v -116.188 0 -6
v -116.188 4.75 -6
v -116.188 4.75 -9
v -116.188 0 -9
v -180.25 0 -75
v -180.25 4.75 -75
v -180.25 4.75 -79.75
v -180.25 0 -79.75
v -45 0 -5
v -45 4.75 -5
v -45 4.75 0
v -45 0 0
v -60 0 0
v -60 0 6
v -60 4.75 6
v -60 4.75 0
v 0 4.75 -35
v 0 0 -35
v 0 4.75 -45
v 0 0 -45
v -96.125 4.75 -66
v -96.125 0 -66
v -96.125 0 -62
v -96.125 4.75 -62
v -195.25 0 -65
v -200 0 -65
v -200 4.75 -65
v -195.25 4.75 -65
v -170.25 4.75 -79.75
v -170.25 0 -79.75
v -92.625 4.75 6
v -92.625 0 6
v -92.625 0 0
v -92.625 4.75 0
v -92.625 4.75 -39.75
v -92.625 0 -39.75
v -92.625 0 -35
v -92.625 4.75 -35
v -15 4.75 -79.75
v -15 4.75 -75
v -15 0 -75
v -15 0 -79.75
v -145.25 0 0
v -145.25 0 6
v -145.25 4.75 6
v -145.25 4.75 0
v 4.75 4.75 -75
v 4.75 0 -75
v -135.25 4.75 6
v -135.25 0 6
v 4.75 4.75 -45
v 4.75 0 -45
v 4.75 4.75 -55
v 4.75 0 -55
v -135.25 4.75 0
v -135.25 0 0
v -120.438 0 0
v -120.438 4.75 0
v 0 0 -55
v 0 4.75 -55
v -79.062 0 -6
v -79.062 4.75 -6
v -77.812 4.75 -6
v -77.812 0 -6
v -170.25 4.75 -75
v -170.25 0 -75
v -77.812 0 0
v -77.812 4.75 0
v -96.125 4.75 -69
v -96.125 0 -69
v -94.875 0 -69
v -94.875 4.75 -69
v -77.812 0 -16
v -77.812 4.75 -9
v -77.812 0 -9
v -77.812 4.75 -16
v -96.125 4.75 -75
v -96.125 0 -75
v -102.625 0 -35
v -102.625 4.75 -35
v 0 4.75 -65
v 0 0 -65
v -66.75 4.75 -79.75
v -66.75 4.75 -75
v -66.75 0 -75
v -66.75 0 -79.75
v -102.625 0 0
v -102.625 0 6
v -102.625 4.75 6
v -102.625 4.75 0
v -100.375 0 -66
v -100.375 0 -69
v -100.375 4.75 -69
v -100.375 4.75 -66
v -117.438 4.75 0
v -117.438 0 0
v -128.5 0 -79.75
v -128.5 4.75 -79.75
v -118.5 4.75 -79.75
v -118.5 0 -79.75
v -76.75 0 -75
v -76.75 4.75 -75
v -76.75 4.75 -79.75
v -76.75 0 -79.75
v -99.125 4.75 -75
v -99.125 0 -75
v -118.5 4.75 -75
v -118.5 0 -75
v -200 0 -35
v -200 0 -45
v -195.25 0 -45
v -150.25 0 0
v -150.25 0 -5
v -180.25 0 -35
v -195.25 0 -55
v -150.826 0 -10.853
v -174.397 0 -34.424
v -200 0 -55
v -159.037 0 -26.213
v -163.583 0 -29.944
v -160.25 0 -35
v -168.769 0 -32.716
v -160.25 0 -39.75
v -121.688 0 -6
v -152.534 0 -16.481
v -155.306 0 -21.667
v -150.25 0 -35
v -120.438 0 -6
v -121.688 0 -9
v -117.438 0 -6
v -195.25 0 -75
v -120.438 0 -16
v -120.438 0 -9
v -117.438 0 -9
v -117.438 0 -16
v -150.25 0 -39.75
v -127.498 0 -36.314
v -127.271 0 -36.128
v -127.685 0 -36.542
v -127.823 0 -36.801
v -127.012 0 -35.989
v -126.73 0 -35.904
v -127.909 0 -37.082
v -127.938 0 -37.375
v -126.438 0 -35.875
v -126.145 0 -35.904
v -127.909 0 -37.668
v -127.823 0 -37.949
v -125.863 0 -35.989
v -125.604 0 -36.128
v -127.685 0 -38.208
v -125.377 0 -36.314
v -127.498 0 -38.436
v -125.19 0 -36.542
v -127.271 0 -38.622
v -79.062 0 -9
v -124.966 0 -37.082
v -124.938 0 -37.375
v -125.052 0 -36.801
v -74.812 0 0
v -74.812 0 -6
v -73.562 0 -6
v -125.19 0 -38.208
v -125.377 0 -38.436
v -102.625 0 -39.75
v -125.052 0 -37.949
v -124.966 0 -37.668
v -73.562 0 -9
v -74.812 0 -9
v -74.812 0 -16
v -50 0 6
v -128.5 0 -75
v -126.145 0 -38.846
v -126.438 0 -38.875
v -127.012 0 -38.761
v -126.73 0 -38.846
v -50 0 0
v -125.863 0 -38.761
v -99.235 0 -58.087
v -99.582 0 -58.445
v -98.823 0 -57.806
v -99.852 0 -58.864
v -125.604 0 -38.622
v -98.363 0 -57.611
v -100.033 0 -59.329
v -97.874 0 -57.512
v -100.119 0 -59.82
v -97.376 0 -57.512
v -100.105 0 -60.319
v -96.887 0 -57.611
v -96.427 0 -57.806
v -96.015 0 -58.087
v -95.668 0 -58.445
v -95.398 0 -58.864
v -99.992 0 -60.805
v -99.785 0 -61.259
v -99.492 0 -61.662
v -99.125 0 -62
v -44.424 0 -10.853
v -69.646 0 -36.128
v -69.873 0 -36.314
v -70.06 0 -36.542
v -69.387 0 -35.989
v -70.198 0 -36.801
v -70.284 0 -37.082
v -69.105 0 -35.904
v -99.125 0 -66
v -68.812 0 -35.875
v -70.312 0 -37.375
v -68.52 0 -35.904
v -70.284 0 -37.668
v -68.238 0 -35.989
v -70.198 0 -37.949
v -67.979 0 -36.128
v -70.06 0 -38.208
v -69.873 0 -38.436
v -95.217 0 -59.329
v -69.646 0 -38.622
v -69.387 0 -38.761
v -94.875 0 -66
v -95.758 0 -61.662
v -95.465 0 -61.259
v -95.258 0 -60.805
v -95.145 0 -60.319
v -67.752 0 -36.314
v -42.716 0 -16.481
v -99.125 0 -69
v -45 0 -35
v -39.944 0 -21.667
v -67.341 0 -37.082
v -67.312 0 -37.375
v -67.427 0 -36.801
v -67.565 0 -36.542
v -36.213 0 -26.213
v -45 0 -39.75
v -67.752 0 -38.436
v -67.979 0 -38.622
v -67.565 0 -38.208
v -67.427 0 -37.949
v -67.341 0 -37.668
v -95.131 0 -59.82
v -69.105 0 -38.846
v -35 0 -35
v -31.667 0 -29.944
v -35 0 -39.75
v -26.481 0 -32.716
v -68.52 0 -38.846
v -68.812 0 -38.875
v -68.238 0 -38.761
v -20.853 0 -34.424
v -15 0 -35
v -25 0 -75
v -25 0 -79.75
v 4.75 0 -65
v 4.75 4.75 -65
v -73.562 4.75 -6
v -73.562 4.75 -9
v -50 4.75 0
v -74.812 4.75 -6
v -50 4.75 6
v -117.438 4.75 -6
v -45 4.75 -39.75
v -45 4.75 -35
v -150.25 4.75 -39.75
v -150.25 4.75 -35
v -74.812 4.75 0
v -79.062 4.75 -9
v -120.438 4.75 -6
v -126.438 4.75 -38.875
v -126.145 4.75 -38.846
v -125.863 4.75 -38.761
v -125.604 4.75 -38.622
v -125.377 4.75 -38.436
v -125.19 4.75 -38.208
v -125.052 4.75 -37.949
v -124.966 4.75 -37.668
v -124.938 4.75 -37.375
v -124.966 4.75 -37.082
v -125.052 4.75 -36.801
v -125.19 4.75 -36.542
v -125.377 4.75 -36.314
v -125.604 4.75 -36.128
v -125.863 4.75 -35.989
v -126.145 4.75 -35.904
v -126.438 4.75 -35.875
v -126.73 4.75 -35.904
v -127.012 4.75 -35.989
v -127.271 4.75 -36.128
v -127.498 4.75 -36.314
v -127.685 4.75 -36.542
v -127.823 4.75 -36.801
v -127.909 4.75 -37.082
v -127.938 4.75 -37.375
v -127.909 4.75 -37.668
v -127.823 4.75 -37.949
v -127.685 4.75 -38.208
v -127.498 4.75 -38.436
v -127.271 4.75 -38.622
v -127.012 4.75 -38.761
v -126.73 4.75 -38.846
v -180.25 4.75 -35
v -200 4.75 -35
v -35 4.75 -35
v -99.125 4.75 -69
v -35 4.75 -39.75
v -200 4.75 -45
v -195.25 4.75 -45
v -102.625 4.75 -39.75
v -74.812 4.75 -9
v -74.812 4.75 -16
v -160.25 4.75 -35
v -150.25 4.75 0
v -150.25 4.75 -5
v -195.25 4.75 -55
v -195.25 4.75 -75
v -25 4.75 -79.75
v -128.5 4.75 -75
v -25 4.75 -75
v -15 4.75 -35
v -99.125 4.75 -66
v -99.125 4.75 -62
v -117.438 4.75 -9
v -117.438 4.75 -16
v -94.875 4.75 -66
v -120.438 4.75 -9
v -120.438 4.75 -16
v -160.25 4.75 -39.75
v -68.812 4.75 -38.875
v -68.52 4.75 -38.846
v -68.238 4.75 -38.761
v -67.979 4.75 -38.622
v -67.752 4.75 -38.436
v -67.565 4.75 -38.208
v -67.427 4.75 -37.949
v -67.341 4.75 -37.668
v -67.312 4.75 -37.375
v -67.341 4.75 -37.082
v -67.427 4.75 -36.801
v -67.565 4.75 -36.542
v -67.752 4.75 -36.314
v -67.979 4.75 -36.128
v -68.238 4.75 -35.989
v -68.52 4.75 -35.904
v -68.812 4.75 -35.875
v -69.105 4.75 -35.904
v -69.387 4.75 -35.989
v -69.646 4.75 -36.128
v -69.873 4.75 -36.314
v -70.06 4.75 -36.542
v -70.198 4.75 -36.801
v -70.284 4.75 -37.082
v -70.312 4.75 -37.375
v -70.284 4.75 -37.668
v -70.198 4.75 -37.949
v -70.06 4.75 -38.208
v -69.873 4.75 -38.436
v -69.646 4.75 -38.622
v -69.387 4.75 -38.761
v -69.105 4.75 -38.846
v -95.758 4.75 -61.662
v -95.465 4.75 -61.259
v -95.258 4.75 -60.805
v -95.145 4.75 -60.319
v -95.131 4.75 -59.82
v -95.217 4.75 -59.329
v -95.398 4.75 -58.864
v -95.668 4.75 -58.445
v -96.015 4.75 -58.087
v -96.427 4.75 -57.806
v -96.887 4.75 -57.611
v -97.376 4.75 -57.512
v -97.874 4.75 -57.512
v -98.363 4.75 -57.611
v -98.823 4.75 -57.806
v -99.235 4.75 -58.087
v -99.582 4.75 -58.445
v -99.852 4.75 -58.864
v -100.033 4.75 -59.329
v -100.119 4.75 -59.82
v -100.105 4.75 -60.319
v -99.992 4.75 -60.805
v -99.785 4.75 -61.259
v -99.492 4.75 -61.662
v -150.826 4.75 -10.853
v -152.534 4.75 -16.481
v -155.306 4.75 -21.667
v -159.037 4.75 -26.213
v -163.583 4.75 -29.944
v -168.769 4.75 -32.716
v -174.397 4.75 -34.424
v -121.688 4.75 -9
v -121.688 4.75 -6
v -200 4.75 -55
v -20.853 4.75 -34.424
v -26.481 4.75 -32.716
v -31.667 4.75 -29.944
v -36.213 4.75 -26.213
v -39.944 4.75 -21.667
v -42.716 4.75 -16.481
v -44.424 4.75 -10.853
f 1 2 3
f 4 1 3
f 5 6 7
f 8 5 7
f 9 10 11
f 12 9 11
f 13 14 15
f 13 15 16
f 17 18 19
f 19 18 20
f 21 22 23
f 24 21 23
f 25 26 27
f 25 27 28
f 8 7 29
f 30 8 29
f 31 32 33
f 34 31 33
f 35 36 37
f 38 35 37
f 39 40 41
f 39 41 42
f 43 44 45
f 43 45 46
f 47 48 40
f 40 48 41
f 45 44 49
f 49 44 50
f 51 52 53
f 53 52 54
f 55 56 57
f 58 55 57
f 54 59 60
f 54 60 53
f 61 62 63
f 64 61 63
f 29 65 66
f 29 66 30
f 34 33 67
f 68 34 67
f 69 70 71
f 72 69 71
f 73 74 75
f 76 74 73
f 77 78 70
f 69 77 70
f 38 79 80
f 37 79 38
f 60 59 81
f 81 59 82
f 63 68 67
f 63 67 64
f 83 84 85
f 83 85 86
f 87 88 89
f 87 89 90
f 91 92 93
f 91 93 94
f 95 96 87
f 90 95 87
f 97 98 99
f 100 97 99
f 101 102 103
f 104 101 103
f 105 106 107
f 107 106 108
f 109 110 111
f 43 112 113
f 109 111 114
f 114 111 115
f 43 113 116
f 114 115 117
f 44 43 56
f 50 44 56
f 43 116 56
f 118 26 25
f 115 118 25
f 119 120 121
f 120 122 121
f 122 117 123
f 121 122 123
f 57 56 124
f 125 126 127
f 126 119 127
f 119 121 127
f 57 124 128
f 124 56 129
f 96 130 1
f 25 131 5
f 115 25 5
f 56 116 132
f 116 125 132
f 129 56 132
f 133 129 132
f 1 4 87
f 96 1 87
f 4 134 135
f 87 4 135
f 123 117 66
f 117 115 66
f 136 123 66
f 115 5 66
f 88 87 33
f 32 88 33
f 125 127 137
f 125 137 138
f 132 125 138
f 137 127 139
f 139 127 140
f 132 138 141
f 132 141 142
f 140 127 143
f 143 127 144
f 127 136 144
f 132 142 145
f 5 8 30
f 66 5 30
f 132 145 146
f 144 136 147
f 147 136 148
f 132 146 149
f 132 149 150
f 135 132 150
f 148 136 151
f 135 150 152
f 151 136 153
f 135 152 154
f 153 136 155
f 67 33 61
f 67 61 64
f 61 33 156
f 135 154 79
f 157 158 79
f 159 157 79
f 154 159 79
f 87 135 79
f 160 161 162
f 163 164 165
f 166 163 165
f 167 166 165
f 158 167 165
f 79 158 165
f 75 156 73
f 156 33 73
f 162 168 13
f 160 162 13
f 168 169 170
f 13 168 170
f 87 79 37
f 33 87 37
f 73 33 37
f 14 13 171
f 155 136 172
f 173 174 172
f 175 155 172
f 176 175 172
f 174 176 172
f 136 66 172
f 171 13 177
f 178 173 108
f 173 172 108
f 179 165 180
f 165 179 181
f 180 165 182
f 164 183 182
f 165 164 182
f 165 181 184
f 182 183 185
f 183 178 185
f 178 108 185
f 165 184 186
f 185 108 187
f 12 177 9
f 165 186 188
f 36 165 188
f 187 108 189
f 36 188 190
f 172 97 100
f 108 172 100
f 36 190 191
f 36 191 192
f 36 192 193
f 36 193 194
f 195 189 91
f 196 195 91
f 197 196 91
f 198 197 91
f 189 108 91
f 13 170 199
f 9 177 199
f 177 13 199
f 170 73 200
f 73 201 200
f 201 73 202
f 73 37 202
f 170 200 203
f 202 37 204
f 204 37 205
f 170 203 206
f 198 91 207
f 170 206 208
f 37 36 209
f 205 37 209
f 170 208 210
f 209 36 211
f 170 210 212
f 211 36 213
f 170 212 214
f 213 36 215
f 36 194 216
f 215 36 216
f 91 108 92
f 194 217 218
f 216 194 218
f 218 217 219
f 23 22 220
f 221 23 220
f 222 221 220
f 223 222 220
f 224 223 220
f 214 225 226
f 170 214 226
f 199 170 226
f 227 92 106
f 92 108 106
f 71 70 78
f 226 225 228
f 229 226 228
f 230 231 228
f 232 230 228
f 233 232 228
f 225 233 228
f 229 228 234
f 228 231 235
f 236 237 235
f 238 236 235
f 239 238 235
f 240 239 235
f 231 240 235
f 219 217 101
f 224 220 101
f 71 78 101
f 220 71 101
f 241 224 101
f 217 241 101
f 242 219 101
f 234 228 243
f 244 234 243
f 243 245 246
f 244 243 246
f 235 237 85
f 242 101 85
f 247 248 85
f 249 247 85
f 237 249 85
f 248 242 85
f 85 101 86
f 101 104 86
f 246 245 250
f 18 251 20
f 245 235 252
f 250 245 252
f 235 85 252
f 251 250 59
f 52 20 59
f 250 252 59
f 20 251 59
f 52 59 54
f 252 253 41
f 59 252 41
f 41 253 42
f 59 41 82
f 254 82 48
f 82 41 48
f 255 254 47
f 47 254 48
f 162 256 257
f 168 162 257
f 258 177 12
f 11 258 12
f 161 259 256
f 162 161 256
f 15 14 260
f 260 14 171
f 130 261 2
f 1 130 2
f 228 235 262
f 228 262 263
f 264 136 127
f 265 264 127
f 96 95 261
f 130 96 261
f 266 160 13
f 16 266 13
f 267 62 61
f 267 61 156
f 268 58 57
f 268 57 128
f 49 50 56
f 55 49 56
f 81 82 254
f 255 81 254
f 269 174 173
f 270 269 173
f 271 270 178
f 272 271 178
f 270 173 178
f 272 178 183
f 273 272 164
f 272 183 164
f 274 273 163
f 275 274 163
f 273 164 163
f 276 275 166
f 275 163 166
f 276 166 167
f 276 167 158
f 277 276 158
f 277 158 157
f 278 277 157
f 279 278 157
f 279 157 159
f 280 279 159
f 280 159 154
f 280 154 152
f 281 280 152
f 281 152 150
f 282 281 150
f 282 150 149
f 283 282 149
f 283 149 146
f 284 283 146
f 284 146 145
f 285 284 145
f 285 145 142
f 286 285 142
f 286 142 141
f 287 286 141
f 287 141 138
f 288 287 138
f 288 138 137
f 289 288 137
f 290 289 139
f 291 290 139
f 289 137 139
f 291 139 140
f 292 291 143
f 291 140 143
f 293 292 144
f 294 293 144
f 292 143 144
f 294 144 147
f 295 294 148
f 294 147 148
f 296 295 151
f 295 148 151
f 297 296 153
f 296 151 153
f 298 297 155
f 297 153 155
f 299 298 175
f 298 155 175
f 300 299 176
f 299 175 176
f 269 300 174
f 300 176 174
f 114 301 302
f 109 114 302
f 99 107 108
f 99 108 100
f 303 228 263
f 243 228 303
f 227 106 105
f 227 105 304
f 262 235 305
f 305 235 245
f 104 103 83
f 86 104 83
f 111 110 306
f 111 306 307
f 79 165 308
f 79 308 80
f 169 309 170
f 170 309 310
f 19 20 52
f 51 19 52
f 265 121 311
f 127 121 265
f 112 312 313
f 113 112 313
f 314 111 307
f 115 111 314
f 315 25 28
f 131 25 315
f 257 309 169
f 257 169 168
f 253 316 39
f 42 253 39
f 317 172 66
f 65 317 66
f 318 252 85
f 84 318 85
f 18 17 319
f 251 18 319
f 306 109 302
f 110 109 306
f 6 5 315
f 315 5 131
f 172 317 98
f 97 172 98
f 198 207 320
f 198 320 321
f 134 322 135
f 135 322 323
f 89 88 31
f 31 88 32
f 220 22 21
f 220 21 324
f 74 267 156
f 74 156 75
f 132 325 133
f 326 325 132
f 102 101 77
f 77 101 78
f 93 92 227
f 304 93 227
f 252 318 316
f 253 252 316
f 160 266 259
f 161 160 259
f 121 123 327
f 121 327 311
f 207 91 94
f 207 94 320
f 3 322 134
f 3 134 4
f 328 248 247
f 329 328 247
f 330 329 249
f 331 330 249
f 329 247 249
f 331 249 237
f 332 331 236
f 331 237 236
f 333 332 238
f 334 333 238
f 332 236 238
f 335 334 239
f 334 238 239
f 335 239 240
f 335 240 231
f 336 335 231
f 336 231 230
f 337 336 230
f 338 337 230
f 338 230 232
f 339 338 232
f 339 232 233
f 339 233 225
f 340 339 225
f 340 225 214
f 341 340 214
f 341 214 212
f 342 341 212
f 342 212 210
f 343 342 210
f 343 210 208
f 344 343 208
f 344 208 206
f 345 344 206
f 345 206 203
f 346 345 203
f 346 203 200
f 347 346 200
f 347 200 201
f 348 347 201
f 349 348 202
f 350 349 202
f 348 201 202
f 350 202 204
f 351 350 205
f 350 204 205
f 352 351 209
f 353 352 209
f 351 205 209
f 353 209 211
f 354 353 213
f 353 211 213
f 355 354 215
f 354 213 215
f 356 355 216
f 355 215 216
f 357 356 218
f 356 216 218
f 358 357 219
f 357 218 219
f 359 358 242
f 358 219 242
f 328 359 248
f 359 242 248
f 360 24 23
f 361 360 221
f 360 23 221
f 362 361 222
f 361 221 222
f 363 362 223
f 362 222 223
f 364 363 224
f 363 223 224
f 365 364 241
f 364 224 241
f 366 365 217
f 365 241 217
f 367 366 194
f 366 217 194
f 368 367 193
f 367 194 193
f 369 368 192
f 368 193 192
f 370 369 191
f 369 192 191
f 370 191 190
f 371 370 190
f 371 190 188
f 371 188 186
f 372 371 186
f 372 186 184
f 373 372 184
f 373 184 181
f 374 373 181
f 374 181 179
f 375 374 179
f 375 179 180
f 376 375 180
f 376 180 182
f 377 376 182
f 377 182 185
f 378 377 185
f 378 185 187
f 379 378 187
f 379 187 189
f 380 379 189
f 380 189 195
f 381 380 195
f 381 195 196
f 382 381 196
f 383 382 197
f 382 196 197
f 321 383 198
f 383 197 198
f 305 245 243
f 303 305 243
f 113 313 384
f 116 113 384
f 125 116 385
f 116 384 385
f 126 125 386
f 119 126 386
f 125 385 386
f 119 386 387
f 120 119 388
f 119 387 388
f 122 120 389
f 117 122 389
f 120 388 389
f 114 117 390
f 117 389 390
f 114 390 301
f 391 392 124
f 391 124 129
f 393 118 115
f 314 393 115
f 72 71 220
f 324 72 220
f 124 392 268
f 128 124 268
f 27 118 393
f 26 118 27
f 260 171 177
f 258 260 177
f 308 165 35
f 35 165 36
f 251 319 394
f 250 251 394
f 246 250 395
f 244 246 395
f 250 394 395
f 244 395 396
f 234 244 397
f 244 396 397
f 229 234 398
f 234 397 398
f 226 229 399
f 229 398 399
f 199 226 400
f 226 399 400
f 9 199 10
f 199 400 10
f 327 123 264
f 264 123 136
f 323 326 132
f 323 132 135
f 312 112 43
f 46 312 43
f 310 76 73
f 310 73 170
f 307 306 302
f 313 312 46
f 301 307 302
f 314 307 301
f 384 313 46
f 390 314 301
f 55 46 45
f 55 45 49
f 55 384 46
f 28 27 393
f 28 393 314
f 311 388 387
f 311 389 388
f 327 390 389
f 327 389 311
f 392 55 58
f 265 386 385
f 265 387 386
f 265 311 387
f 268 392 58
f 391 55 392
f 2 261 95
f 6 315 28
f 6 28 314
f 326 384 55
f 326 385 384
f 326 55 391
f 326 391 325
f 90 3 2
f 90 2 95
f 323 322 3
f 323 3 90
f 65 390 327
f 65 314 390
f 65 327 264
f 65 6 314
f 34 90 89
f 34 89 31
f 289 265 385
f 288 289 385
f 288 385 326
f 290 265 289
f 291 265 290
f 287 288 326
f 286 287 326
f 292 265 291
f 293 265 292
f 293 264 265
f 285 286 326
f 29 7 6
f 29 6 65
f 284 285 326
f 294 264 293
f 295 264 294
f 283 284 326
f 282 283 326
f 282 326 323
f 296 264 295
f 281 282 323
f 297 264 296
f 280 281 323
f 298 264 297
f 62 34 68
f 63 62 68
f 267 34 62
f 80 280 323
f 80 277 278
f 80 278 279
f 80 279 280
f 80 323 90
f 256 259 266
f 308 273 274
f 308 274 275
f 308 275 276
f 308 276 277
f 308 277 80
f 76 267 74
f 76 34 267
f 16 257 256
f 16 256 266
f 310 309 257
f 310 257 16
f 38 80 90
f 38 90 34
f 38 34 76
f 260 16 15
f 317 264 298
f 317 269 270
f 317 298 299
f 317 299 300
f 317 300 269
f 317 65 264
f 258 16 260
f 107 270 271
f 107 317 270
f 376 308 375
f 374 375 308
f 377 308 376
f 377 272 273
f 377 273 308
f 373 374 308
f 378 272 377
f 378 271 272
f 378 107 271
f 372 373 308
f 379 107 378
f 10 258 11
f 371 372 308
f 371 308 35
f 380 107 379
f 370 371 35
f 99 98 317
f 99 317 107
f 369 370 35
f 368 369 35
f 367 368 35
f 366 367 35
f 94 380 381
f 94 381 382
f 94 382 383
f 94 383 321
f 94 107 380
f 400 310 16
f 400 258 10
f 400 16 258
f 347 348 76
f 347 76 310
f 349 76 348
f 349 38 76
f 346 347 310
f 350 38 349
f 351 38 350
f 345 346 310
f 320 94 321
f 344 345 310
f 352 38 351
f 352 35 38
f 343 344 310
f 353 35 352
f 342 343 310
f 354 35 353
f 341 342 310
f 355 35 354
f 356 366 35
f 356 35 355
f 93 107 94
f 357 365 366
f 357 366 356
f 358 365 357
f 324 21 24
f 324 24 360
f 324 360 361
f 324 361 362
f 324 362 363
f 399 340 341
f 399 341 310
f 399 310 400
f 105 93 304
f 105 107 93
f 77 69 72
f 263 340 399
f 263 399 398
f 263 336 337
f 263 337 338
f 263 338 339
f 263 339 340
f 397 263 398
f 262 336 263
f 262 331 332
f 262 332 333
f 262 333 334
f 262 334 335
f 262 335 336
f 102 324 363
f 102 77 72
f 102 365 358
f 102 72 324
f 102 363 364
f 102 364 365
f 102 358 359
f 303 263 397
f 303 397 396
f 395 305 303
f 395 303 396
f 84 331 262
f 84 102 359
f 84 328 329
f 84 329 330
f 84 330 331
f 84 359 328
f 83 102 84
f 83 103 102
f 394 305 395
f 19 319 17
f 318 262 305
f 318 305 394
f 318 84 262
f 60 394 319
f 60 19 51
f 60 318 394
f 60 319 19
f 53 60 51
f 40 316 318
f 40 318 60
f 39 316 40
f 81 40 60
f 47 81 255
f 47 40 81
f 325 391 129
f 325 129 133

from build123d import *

# Parameters (mm, degrees)
SKETCH1_W           = 4.75
SKETCH1_H           = 10
SKETCH1_W_2         = 195.25
SKETCH1_H_2         = 75
SKETCH1_W_3         = 10
SKETCH1_H_3         = 6
SKETCH1_H_4         = 35
BOSS_EXTRUDE1_DEPTH = 4.75
SKETCH3_W           = 4.75
SKETCH3_H           = 35
CUT_EXTRUDE2_DEPTH  = 4.75
SKETCH4_W           = 3
SKETCH4_H           = 16
SKETCH4_W_2         = 5.5
SKETCH4_H_2         = 3
CUT_EXTRUDE3_DEPTH  = 4.75
SKETCH5_W           = 10
SKETCH5_H           = 4.75
CUT_EXTRUDE4_DEPTH  = 214.652901923
SKETCH6_R           = 1.5
CUT_EXTRUDE5_DEPTH  = 214.652901923
SKETCH7_W           = 10
SKETCH7_H           = 4.75
BOSS_EXTRUDE2_DEPTH = 4.75
SKETCH8_R           = 2.5
CUT_EXTRUDE6_DEPTH  = 216.366257803
SKETCH9_W           = 3
SKETCH9_H           = 16
SKETCH9_W_2         = 5.5
SKETCH9_H_2         = 3
CUT_EXTRUDE7_DEPTH  = 10


with BuildPart() as part:
    # Sketch1 → Boss-Extrude1 (new body)
    with BuildSketch(Plane(origin=(0, 0, 0), x_dir=(1, 0, 0), z_dir=(0, 1, 0))):
        with Locations((-197.625, 60)):
            Rectangle(SKETCH1_W, SKETCH1_H)
        with Locations((-97.625, 37.5)):
            Rectangle(SKETCH1_W_2, SKETCH1_H_2)
        with Locations((-140.25, -3)):
            Rectangle(SKETCH1_W_3, SKETCH1_H_3)
        with Locations((-97.625, -3)):
            Rectangle(SKETCH1_W_3, SKETCH1_H_3)
        with Locations((-55, -3)):
            Rectangle(SKETCH1_W_3, SKETCH1_H_3)
        with Locations((2.375, 17.5)):
            Rectangle(SKETCH1_W, SKETCH1_H_4)
        with Locations((2.375, 50)):
            Rectangle(SKETCH1_W, SKETCH1_H)
        with Locations((2.375, 70)):
            Rectangle(SKETCH1_W, SKETCH1_H)
        with Locations((-197.625, 40)):
            Rectangle(SKETCH1_W, SKETCH1_H)
    extrude(amount=BOSS_EXTRUDE1_DEPTH)

    # Sketch3 → Cut-Extrude2 (cut)
    with BuildSketch(Plane(origin=(0, 4.75, 0), x_dir=(1, 0, 0), z_dir=(0, 1, 0))):
        with BuildLine():
            Line((-180.25, 35), (-195.25, 35))
            Line((-195.25, 35), (-195.25, 0))
            Line((-195.25, 0), (-150.25, 0))
            Line((-150.25, 0), (-150.25, 5))
            ThreePointArc((-150.25, 5), (-159.036796564, 26.213203436), (-180.25, 35))
        make_face()
        with BuildLine():
            Line((-45, 0), (0, 0))
            Line((0, 0), (0, 35))
            Line((0, 35), (-15, 35))
            ThreePointArc((-15, 35), (-36.213203436, 26.213203436), (-45, 5))
            Line((-45, 5), (-45, 0))
        make_face()
        with Locations((2.375, 17.5)):
            Rectangle(SKETCH3_W, SKETCH3_H)
    extrude(amount=-CUT_EXTRUDE2_DEPTH, mode=Mode.SUBTRACT)

    # Sketch4 → Cut-Extrude3 (cut)
    with BuildSketch(Plane(origin=(0, 4.75, 0), x_dir=(1, 0, 0), z_dir=(0, 1, 0))):
        with Locations((-118.9375, 8)):
            Rectangle(SKETCH4_W, SKETCH4_H)
        with Locations((-76.3125, 8)):
            Rectangle(SKETCH4_W, SKETCH4_H)
        with Locations((-118.9375, 7.5)):
            Rectangle(SKETCH4_W_2, SKETCH4_H_2)
        with Locations((-76.3125, 7.5)):
            Rectangle(SKETCH4_W_2, SKETCH4_H_2)
    extrude(amount=-CUT_EXTRUDE3_DEPTH, mode=Mode.SUBTRACT)

    # Sketch5 → Cut-Extrude4 (cut, through all)
    with BuildSketch(Plane.XZ):
        with Locations((-155.25, -37.375)):
            Rectangle(SKETCH5_W, SKETCH5_H)
        with Locations((-97.625, -37.375)):
            Rectangle(SKETCH5_W, SKETCH5_H)
        with Locations((-40, -37.375)):
            Rectangle(SKETCH5_W, SKETCH5_H)
    extrude(amount=-CUT_EXTRUDE4_DEPTH, mode=Mode.SUBTRACT)

    # Sketch6 → Cut-Extrude5 (cut, through all)
    with BuildSketch(Plane.XZ):
        with Locations(Location((-68.8125, -37.375, 0), (0, 0, 270))):
            Circle(SKETCH6_R)
        with Locations(Location((-126.4375, -37.375, 0), (0, 0, 270))):
            Circle(SKETCH6_R)
    extrude(amount=-CUT_EXTRUDE5_DEPTH, mode=Mode.SUBTRACT)

    # Sketch7 → Boss-Extrude2 (add)
    with BuildSketch(Plane(origin=(0, 4.75, 0), x_dir=(1, 0, 0), z_dir=(0, 1, 0))):
        with Locations((-175.25, 77.375)):
            Rectangle(SKETCH7_W, SKETCH7_H)
        with Locations((-123.5, 77.375)):
            Rectangle(SKETCH7_W, SKETCH7_H)
        with Locations((-71.75, 77.375)):
            Rectangle(SKETCH7_W, SKETCH7_H)
        with Locations((-20, 77.375)):
            Rectangle(SKETCH7_W, SKETCH7_H)
    extrude(amount=-BOSS_EXTRUDE2_DEPTH)

    # Sketch8 → Cut-Extrude6 (cut, through all)
    with BuildSketch(Plane.XZ):
        with Locations(Location((-97.625, -60, 0), (0, 0, 270))):
            Circle(SKETCH8_R)
    extrude(amount=-CUT_EXTRUDE6_DEPTH, mode=Mode.SUBTRACT)

    # Sketch9 → Cut-Extrude7 (cut)
    with BuildSketch(Plane.XZ):
        with Locations((-97.625, -67)):
            Rectangle(SKETCH9_W, SKETCH9_H)
        with Locations((-97.625, -67.5)):
            Rectangle(SKETCH9_W_2, SKETCH9_H_2)
    extrude(amount=-CUT_EXTRUDE7_DEPTH, mode=Mode.SUBTRACT)


solid = part.part
